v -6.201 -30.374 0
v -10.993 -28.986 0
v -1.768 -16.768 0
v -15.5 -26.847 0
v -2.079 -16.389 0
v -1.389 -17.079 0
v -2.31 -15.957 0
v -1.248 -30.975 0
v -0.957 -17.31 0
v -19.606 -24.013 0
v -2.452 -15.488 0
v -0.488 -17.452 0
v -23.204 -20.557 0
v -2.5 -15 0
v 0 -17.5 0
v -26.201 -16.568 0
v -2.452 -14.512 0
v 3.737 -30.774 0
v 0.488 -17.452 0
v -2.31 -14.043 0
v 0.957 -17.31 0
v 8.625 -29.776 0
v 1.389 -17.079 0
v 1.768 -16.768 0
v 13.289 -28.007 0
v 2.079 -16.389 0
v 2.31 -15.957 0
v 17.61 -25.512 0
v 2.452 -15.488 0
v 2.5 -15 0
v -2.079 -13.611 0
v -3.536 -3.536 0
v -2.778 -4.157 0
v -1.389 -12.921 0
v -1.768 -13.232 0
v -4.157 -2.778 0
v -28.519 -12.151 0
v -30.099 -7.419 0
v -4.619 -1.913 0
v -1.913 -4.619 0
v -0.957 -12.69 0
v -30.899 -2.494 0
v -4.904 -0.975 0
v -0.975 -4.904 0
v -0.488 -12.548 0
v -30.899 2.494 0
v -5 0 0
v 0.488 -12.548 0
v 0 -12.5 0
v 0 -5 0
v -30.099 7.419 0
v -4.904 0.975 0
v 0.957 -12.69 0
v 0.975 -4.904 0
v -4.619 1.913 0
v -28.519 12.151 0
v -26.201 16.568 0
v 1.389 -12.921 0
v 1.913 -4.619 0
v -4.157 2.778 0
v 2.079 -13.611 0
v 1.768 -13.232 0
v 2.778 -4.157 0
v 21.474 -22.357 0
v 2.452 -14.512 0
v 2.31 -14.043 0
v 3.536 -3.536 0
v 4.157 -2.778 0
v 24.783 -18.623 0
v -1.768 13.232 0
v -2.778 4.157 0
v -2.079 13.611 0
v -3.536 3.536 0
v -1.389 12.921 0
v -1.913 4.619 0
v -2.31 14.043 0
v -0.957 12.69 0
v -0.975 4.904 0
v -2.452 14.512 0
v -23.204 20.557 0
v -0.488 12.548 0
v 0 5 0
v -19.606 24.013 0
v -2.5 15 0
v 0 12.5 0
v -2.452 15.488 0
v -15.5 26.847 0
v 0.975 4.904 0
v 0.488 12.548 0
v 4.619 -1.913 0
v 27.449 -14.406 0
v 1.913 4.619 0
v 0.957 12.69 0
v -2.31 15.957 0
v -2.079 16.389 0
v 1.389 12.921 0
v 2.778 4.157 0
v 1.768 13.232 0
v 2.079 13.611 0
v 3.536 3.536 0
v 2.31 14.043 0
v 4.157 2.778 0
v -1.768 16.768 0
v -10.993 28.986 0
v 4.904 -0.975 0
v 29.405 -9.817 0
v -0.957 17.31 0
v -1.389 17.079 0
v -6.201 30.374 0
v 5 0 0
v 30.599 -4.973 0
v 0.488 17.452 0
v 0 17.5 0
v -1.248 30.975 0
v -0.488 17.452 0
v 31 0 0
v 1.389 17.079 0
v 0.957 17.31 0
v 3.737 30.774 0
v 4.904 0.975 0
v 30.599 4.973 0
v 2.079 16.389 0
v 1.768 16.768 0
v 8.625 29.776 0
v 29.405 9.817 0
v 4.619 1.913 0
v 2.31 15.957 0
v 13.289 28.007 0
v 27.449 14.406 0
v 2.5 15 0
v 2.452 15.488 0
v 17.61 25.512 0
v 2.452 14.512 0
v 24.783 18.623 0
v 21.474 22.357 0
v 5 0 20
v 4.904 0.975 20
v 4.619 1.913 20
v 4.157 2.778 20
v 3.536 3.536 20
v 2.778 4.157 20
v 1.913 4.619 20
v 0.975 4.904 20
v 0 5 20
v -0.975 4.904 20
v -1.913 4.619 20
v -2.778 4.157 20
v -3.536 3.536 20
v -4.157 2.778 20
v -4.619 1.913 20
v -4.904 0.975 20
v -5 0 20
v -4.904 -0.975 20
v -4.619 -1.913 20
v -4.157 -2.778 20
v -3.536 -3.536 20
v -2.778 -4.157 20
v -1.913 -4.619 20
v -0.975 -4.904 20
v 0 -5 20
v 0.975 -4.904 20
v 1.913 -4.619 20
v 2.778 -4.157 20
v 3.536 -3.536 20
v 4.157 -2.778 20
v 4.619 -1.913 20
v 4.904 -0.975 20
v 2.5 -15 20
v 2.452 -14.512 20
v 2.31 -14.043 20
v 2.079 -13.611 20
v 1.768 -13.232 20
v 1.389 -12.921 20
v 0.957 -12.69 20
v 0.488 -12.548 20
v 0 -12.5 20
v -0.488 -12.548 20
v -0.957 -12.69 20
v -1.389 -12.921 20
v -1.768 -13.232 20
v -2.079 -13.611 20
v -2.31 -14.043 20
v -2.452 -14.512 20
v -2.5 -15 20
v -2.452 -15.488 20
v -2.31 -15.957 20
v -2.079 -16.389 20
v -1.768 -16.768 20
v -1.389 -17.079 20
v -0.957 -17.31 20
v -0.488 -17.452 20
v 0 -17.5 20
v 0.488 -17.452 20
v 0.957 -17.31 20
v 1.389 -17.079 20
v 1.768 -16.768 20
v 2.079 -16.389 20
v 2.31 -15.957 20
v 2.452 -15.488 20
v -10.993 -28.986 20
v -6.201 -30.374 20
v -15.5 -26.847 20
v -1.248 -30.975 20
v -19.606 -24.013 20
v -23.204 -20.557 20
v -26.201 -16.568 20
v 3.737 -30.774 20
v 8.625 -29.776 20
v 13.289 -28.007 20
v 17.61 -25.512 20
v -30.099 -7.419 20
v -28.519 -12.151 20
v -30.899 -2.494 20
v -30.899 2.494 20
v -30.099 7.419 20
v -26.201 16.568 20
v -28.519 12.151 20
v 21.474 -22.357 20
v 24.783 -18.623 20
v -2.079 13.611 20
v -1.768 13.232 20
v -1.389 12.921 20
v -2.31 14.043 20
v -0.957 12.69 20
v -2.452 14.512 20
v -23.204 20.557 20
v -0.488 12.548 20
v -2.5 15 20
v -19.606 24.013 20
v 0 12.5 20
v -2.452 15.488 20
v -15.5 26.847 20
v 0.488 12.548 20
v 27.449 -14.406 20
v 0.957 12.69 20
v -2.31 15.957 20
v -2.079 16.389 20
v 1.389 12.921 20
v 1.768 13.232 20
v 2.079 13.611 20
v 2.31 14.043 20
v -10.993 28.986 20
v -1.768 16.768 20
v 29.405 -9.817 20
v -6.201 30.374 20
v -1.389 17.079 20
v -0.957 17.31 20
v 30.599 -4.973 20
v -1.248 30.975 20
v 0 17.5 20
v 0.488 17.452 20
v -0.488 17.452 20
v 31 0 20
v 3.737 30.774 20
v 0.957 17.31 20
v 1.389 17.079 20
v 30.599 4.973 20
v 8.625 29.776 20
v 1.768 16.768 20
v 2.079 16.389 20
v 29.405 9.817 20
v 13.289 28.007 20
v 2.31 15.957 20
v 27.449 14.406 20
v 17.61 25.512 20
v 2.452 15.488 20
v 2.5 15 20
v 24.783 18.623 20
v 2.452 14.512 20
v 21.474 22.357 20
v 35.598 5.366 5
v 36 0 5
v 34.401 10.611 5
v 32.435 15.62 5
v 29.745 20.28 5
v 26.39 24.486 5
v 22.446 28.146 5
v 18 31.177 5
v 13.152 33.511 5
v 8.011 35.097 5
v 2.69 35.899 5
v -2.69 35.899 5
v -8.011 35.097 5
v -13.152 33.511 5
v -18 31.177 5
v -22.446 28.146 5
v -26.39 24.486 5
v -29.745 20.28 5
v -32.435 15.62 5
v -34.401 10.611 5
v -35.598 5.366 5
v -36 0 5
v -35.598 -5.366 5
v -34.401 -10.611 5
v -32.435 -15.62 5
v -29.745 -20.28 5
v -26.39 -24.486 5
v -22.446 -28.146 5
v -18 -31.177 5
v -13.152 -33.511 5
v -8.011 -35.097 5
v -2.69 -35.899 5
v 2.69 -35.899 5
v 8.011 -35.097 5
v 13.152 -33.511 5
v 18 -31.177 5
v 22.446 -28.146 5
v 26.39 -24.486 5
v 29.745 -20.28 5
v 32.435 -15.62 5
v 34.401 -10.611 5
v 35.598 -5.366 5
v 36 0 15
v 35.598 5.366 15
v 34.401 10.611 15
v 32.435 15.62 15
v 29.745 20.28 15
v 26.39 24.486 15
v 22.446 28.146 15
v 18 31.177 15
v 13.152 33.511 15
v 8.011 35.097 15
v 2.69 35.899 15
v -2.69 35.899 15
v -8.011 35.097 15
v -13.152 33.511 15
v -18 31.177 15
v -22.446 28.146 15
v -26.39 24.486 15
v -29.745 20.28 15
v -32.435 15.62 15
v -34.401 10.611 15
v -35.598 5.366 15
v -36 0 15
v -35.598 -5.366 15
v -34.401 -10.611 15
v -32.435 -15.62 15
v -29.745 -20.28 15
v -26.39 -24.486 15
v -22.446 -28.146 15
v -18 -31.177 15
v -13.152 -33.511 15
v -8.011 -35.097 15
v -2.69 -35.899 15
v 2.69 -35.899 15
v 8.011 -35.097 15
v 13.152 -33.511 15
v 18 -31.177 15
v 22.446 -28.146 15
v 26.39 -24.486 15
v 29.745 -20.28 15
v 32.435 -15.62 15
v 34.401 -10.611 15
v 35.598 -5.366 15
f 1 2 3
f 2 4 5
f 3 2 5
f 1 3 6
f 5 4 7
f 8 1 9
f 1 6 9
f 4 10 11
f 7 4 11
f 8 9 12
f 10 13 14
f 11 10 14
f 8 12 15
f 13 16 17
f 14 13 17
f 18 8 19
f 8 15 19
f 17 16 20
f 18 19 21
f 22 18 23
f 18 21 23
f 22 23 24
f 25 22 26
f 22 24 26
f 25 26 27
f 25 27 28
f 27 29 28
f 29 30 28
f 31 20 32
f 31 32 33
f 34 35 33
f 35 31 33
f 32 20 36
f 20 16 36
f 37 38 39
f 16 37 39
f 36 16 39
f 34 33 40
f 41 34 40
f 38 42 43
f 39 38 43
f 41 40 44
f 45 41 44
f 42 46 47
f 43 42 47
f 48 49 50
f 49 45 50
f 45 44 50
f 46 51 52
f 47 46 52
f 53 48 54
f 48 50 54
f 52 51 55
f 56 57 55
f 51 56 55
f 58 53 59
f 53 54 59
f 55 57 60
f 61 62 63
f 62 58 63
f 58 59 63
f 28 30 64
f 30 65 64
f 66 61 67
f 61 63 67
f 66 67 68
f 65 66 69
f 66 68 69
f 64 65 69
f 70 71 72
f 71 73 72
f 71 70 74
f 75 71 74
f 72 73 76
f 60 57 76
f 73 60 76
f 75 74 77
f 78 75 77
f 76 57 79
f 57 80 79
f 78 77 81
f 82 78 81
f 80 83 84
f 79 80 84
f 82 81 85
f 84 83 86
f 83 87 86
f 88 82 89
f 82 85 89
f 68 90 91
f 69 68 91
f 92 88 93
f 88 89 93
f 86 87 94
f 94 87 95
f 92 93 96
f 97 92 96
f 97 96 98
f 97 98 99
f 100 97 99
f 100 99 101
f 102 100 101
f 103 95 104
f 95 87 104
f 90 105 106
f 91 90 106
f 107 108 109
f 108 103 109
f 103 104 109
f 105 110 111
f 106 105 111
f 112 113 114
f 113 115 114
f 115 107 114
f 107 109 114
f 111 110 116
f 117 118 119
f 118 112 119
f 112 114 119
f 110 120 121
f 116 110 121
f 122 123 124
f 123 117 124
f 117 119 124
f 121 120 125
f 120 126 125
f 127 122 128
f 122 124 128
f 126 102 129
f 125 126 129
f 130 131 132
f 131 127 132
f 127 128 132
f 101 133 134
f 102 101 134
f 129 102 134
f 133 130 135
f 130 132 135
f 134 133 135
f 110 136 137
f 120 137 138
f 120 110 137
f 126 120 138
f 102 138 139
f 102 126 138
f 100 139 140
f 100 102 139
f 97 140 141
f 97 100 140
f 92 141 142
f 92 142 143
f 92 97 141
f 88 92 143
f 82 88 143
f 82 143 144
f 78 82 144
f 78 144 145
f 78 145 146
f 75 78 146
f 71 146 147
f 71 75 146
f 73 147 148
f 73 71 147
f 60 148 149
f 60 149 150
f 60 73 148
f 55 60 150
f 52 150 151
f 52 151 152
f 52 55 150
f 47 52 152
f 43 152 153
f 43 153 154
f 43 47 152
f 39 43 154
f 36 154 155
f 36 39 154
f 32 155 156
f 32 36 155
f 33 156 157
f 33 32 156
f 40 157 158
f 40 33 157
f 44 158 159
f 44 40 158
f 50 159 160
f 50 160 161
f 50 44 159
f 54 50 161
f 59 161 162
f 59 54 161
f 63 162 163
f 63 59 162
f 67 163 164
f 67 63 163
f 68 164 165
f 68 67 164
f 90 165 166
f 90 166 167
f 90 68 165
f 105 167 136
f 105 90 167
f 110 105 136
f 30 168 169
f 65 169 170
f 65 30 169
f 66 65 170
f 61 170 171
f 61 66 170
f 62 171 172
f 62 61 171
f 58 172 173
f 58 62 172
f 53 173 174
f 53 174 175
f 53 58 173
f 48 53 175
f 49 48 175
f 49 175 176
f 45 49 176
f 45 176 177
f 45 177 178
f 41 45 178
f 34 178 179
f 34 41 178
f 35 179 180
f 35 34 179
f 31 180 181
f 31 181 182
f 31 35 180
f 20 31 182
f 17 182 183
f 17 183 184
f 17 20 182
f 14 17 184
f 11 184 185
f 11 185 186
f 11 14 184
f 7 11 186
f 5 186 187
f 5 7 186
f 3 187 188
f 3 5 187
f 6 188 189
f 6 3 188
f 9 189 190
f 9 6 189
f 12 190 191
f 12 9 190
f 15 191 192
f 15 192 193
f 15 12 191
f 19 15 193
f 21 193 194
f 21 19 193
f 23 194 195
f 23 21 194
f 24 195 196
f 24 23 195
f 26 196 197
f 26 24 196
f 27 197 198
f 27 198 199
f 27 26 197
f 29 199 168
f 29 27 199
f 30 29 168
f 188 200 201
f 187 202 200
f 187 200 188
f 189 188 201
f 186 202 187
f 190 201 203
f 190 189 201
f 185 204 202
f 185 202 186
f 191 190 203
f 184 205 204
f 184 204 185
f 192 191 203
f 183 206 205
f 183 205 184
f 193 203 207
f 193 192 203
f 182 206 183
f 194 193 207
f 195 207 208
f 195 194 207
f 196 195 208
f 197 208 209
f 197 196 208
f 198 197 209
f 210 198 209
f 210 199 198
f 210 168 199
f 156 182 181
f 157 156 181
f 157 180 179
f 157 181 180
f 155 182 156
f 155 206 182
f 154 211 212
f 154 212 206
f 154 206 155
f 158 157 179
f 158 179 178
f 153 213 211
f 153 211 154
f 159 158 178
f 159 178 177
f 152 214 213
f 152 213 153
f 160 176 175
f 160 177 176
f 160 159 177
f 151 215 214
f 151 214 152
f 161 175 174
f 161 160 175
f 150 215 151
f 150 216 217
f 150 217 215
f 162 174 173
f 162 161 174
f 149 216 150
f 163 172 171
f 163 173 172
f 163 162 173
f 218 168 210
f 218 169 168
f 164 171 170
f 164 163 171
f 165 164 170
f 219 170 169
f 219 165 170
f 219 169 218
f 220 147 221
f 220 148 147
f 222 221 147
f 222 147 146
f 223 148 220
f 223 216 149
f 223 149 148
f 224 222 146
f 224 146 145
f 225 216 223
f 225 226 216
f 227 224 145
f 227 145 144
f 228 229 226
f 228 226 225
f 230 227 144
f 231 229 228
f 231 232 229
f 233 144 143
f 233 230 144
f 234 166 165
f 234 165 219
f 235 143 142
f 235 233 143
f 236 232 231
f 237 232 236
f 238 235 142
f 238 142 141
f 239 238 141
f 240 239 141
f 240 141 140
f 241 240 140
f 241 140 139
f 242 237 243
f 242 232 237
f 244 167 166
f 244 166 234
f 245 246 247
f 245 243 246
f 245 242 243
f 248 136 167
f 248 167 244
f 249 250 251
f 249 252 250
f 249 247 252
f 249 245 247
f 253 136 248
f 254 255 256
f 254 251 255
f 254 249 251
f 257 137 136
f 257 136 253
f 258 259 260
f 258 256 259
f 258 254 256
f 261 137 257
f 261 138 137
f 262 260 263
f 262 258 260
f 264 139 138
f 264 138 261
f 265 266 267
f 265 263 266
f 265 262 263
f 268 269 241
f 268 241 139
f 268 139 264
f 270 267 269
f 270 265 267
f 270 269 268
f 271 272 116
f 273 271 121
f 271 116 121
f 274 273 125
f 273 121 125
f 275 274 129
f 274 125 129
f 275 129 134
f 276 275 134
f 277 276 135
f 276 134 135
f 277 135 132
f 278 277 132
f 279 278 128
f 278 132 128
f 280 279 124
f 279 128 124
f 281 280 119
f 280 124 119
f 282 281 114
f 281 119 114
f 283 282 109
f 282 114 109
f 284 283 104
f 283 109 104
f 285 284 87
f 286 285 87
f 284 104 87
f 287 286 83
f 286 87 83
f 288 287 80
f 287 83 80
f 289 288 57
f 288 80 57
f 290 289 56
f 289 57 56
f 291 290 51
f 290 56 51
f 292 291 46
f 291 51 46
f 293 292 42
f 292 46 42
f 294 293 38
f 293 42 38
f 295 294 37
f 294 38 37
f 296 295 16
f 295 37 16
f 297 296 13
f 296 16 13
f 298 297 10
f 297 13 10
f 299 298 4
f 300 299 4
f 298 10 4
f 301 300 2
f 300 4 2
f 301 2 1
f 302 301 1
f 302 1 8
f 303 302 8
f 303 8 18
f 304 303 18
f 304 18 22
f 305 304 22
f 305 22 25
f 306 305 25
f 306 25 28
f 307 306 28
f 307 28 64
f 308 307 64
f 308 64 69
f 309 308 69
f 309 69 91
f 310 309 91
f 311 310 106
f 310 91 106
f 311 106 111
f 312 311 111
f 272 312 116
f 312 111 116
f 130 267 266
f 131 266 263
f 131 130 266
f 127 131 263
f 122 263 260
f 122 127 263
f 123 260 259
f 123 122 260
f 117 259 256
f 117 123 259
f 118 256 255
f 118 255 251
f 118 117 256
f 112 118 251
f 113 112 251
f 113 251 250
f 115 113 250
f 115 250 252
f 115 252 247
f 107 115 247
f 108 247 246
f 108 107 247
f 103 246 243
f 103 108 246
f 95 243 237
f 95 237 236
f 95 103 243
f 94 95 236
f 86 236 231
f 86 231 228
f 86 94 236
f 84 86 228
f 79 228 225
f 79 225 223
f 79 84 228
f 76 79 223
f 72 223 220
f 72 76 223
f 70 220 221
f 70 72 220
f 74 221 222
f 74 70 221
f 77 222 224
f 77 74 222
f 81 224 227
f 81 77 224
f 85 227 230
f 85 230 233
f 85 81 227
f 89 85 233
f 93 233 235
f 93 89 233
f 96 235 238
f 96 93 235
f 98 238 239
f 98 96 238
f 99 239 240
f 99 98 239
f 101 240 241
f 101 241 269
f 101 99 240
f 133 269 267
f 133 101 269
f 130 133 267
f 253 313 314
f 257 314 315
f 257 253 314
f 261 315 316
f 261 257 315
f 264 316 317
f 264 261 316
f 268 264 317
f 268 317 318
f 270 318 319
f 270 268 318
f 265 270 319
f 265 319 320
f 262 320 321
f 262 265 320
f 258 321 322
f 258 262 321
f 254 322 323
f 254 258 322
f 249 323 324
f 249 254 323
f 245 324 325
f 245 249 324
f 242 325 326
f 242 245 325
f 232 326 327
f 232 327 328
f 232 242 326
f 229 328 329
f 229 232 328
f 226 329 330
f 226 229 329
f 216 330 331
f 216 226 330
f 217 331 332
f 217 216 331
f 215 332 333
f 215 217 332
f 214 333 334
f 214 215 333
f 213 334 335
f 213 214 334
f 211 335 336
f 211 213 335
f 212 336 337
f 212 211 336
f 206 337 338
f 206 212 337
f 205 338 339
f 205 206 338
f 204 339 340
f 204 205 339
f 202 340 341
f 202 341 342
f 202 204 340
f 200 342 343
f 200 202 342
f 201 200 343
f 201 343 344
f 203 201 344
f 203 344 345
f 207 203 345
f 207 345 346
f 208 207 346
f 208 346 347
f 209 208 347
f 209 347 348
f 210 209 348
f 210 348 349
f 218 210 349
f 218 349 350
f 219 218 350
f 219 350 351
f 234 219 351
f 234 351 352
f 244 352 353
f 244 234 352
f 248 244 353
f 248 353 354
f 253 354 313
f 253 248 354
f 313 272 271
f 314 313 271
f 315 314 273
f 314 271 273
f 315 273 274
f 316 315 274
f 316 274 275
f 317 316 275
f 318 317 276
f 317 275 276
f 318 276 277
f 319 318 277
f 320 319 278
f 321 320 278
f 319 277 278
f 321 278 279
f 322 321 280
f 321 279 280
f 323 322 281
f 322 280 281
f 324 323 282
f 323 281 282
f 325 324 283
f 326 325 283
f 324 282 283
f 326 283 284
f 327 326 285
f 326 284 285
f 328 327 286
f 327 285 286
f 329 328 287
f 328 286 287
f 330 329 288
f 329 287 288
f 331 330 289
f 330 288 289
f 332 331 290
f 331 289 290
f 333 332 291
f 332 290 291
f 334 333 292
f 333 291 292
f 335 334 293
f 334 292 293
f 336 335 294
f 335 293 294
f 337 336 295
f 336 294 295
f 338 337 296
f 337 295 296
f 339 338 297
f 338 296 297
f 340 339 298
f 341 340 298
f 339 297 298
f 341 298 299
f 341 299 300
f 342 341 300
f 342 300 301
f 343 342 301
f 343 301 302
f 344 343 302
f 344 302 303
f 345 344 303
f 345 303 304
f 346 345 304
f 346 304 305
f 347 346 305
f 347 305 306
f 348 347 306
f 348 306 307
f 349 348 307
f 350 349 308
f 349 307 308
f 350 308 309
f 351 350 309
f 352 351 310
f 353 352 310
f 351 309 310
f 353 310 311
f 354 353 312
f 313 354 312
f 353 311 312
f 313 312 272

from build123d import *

# Parameters (mm, degrees)
SKETCH_1_R      = 36
SKETCH_1_R_2    = 5
SKETCH_1_R_3    = 2.5
EXTRUDE_1_DEPTH = 20
CHAMFER_1_SIZE  = 5


with BuildPart() as part:
    # 草圖1 → 填料-伸長1 (new body)
    with BuildSketch(Plane.XY):
        Circle(SKETCH_1_R)
        Circle(SKETCH_1_R_2, mode=Mode.SUBTRACT)
        with Locations((0, 15)):
            Circle(SKETCH_1_R_3, mode=Mode.SUBTRACT)
        with Locations((0, -15)):
            Circle(SKETCH_1_R_3, mode=Mode.SUBTRACT)
    extrude(amount=EXTRUDE_1_DEPTH)

    # 導角1
    chamfer_1_edges = [part.edges().sort_by_distance(p)[0] for p in [
        (-36, 0, 0),
        (-36, 0, 20),
    ]]
    chamfer(chamfer_1_edges, length=CHAMFER_1_SIZE)


solid = part.part
